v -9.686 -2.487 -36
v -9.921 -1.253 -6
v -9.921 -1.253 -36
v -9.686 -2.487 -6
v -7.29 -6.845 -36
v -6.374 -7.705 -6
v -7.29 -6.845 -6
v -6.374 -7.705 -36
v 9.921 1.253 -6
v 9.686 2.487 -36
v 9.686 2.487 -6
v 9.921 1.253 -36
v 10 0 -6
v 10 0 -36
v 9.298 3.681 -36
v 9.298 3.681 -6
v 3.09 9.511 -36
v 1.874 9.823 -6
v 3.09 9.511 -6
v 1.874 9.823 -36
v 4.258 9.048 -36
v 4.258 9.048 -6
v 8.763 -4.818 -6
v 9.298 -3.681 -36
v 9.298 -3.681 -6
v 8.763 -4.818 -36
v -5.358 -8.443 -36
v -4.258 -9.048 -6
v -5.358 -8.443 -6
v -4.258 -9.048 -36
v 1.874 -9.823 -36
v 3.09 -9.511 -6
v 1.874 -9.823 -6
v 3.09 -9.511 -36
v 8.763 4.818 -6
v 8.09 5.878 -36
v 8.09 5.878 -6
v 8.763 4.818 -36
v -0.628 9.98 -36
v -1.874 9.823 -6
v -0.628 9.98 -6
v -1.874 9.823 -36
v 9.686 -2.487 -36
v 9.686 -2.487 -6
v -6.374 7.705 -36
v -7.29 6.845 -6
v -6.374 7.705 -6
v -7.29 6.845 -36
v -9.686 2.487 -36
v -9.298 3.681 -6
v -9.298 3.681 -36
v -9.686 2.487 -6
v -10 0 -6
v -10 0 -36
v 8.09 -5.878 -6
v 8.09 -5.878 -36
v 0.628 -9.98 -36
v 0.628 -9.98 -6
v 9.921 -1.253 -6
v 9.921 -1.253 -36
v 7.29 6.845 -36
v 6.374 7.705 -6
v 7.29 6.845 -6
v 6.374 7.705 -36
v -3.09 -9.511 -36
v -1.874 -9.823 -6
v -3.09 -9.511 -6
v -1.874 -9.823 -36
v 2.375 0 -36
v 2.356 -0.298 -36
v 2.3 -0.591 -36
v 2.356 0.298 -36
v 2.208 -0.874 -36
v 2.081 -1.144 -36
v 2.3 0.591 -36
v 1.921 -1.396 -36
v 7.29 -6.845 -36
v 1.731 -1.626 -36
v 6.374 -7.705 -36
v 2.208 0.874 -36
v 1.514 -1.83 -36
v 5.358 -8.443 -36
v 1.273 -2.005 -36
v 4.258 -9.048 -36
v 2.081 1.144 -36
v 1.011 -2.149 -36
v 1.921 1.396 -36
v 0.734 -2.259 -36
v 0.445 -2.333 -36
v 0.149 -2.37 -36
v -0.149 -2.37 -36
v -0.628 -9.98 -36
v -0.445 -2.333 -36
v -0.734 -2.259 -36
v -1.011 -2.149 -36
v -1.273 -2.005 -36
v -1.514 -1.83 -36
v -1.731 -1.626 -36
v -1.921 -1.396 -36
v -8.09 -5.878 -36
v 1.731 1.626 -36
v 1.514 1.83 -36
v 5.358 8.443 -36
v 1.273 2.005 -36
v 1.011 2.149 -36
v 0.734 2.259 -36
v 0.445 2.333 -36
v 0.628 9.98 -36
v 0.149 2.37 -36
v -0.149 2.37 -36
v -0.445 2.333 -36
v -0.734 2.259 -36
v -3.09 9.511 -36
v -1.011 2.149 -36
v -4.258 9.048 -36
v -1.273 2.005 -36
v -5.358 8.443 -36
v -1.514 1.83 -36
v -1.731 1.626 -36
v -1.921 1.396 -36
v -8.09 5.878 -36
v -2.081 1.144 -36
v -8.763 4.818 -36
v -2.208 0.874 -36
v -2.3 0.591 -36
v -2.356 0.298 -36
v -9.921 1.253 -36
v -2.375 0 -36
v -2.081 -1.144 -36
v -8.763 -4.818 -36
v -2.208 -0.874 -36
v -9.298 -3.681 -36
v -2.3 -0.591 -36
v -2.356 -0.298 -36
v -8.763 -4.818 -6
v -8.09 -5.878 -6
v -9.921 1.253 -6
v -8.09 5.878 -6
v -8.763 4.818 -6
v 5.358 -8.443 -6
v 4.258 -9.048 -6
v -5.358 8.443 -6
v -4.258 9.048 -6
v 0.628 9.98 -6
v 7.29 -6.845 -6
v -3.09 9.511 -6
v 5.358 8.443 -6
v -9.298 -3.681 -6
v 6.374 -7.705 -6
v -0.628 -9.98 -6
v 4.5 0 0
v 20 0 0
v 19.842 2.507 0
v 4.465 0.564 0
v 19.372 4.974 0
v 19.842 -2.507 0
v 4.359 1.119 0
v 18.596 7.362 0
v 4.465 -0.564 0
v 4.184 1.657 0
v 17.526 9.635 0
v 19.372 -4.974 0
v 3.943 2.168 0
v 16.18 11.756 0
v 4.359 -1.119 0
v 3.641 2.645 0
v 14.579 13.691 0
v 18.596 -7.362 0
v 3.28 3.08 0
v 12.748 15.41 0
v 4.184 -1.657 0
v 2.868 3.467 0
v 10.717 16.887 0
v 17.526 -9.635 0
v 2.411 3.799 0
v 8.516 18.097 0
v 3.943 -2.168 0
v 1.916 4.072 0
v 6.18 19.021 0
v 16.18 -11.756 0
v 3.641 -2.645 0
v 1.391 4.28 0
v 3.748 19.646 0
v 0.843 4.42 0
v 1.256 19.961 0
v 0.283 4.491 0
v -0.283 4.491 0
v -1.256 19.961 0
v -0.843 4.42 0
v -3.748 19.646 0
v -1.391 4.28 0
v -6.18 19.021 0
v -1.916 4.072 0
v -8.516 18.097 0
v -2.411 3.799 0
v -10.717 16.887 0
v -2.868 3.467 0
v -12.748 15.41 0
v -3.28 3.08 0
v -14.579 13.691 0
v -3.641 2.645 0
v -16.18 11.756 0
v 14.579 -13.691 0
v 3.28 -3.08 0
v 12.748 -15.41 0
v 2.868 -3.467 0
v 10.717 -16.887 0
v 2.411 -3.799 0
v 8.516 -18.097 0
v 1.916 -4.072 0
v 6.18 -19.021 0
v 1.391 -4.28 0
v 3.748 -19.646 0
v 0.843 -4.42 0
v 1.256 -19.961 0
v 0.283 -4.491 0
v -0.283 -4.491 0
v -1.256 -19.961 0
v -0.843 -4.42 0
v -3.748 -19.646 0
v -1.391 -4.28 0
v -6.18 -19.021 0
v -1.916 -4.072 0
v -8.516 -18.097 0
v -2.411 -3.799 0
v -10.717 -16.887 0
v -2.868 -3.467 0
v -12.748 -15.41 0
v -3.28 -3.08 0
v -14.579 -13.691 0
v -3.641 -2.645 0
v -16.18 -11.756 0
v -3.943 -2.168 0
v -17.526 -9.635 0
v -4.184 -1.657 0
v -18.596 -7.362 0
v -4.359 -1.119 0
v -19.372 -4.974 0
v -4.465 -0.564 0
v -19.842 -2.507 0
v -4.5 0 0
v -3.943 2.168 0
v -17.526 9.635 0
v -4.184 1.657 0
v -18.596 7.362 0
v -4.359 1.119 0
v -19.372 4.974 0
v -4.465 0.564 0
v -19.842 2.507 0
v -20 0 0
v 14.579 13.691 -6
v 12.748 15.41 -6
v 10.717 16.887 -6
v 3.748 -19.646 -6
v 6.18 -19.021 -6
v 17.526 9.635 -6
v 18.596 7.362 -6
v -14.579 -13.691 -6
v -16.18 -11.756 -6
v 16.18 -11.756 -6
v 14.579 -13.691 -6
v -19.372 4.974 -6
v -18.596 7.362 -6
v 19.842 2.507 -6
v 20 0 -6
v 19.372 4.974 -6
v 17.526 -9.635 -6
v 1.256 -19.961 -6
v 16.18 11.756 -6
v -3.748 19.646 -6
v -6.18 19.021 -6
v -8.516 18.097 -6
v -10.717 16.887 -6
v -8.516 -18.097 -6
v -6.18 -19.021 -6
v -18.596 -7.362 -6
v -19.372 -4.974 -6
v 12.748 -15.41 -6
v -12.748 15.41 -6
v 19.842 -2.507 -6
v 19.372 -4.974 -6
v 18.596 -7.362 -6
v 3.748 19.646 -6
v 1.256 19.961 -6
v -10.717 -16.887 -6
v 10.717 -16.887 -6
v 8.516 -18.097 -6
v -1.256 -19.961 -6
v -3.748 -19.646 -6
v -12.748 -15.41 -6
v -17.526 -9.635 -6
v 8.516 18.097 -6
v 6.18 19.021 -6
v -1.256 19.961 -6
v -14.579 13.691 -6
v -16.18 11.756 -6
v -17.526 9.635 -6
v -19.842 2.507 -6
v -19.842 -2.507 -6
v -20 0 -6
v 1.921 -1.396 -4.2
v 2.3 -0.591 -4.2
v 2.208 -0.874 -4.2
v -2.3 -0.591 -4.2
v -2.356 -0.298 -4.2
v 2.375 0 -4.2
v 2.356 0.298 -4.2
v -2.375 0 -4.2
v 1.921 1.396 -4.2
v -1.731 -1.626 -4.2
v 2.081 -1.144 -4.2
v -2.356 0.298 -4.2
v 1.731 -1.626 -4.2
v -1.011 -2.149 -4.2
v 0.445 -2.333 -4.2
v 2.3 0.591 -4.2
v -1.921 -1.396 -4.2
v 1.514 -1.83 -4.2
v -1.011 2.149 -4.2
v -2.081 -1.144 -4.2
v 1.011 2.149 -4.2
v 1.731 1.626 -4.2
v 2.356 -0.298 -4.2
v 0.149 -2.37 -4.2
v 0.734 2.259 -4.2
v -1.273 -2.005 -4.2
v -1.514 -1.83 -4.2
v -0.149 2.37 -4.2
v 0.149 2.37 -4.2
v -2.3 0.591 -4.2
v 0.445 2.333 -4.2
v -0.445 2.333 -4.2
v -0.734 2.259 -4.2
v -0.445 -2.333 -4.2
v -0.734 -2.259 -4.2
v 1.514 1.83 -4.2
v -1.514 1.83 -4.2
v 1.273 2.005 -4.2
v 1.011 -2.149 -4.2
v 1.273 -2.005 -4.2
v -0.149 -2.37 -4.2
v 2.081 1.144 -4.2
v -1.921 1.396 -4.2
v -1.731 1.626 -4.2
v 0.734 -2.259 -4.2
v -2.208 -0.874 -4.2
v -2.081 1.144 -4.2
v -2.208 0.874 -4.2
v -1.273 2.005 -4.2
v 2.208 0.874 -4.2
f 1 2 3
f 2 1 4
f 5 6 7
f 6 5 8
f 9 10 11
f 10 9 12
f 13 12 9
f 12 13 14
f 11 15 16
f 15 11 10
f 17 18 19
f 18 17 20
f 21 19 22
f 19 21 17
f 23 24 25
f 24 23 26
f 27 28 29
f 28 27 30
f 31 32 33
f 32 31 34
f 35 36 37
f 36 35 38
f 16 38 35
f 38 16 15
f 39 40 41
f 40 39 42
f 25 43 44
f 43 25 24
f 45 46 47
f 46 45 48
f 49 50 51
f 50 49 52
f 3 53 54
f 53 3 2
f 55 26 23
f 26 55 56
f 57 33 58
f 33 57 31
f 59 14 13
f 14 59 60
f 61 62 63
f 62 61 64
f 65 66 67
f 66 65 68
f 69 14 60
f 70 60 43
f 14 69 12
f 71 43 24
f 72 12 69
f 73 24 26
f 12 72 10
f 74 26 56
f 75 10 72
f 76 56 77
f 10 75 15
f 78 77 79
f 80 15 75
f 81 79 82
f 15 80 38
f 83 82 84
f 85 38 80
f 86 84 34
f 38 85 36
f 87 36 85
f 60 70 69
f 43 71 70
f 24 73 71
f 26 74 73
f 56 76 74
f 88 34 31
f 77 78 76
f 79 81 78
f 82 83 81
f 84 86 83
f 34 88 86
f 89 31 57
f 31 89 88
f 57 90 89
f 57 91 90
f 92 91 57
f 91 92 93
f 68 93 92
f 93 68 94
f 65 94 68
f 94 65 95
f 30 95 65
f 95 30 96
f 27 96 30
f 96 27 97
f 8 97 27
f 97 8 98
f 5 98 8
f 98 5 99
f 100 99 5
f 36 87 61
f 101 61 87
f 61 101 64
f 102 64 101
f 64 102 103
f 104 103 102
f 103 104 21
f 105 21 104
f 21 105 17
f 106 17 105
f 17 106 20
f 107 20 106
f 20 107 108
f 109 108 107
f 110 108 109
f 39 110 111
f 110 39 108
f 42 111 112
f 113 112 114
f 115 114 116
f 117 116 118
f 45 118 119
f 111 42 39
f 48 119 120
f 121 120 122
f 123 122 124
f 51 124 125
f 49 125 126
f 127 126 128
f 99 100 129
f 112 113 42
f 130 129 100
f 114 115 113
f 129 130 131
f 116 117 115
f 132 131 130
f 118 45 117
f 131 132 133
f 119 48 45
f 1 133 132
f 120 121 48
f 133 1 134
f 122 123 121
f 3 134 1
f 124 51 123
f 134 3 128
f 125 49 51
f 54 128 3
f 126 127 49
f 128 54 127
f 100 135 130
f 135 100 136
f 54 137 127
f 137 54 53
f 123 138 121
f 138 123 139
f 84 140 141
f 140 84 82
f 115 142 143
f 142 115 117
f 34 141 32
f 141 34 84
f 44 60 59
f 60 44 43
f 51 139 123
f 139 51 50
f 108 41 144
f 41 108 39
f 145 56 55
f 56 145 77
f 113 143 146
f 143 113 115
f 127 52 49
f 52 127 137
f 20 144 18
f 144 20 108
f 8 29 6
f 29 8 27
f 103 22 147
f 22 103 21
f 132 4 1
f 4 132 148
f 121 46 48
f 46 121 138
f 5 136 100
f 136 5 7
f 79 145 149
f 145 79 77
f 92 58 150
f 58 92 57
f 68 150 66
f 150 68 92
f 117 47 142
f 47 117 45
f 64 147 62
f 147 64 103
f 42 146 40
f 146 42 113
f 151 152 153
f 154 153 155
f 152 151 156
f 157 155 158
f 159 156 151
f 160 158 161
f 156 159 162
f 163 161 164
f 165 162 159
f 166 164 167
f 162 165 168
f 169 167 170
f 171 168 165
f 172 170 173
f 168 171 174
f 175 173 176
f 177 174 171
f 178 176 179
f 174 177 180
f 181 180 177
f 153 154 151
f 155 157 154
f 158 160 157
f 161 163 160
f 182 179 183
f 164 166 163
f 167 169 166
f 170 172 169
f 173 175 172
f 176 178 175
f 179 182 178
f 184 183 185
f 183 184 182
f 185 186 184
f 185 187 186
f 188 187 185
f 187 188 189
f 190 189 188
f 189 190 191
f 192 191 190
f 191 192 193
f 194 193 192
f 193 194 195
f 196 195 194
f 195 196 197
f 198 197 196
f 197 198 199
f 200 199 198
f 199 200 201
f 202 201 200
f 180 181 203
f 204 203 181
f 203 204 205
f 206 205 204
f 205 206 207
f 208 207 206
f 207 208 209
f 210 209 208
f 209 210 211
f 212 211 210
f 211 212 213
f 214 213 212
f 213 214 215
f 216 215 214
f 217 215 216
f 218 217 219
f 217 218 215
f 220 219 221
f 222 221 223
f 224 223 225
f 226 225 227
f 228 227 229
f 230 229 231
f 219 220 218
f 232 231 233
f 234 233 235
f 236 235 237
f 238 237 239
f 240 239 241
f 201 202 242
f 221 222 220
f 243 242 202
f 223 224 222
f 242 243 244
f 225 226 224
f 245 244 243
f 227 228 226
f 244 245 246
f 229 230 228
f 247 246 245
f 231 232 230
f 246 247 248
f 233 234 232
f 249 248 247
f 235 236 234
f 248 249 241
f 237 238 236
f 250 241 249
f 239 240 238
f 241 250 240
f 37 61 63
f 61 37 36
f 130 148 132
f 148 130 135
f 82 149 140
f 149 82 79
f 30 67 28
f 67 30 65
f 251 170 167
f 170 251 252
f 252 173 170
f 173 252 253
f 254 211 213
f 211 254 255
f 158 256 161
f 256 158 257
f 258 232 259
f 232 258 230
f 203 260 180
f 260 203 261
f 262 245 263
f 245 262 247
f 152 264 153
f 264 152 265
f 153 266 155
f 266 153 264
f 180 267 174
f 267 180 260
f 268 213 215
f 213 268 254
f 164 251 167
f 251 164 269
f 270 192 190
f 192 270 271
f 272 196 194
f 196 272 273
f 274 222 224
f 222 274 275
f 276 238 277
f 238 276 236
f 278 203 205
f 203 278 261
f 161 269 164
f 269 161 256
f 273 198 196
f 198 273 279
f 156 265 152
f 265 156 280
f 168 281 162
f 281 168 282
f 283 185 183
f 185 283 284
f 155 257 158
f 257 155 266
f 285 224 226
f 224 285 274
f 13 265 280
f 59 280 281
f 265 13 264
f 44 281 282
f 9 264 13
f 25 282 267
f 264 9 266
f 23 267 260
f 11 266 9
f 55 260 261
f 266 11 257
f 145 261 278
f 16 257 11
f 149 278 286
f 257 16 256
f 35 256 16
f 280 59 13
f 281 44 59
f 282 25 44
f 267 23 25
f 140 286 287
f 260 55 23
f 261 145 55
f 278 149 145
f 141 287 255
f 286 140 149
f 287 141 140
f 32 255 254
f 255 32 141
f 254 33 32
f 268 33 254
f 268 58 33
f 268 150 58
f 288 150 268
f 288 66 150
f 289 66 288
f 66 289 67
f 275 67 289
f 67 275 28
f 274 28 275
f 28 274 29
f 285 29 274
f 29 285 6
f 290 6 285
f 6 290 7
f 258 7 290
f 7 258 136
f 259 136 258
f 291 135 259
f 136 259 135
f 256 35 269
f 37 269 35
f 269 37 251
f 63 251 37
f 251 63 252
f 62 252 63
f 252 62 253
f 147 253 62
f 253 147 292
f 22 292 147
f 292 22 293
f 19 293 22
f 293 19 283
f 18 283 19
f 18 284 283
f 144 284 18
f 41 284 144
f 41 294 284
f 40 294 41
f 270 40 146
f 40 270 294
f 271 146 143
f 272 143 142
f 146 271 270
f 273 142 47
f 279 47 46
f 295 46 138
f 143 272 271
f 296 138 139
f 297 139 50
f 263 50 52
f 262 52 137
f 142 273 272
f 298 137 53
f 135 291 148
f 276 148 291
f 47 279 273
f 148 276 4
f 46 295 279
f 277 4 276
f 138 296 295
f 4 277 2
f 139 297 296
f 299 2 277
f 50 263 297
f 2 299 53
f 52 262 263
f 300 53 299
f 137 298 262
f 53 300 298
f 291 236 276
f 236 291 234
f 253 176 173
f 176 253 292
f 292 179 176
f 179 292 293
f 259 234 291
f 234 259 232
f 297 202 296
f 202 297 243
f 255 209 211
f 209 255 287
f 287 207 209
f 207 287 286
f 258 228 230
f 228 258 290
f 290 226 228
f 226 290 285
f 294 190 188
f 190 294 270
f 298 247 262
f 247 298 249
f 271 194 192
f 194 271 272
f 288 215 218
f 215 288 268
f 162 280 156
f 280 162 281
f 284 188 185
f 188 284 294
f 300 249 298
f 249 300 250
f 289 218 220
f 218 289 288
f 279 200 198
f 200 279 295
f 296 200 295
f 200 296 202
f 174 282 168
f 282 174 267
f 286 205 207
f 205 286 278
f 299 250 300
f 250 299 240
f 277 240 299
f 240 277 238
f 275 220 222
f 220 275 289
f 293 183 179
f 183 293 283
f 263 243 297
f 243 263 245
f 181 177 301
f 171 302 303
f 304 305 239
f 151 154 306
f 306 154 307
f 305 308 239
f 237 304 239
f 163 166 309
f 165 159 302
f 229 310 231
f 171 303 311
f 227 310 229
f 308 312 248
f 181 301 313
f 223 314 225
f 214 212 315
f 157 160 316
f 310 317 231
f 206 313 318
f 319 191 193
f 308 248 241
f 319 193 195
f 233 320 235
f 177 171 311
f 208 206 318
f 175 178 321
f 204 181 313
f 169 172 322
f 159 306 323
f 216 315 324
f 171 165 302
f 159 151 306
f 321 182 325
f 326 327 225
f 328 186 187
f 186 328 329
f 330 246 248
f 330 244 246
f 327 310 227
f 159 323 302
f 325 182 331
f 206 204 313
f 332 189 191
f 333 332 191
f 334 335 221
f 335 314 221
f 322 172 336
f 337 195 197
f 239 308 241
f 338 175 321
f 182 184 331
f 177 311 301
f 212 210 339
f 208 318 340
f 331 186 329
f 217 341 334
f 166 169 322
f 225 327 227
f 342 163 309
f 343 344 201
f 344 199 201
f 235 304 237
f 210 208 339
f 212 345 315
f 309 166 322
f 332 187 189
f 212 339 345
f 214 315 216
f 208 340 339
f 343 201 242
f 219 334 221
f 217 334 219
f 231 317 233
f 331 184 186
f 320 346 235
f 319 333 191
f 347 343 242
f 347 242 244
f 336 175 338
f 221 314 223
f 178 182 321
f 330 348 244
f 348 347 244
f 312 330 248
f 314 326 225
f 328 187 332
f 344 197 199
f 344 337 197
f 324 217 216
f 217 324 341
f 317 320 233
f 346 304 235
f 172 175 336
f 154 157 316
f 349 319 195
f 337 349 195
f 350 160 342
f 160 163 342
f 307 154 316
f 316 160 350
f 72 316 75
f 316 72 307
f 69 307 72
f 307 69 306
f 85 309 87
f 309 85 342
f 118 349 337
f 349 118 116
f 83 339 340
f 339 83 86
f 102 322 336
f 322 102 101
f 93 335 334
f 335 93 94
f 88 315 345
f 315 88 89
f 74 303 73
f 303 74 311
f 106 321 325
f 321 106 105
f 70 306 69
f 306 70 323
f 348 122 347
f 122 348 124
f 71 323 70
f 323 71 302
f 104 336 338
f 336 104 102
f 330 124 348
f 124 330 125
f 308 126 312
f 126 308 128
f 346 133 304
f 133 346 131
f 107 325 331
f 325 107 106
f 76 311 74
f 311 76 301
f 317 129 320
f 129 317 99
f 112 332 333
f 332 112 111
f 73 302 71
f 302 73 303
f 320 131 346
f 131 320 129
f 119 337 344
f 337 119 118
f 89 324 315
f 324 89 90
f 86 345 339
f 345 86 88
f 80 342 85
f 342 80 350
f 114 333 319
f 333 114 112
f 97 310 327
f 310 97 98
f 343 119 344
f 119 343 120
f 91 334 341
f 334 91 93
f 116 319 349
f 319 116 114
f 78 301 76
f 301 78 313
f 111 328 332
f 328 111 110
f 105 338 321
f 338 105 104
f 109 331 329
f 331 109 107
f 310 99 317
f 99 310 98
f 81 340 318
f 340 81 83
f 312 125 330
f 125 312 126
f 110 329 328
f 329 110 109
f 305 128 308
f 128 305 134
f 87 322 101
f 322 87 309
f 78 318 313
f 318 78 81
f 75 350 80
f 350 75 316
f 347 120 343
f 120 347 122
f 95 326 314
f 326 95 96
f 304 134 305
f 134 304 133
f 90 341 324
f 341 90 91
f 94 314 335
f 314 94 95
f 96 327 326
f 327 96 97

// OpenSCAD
$fn = 50;


difference() {
	union() {
		translate(v = [0, 0, -36.0000000000]) {
			cylinder(h = 36, r = 10.0000000000);
		}
		translate(v = [0, 0, -6.0000000000]) {
			cylinder(h = 6, r = 20.0000000000);
		}
	}
	union() {
		translate(v = [0, 0, 0]) {
			rotate(a = [0, 0, 0]) {
				difference() {
					union() {
						#translate(v = [0, 0, -36.0000000000]) {
							cylinder(h = 36, r = 2.2500000000);
						}
						#translate(v = [0, 0, -4.2000000000]) {
							cylinder(h = 4.2000000000, r = 10.0000000000, r1 = 2.3750000000, r2 = 4.5000000000);
						}
						#translate(v = [0, 0, -36.0000000000]) {
							cylinder(h = 36, r = 2.3750000000);
						}
						#translate(v = [0, 0, -36.0000000000]) {
							cylinder(h = 36, r = 2.2500000000);
						}
					}
					union();
				}
			}
		}
	}
}
